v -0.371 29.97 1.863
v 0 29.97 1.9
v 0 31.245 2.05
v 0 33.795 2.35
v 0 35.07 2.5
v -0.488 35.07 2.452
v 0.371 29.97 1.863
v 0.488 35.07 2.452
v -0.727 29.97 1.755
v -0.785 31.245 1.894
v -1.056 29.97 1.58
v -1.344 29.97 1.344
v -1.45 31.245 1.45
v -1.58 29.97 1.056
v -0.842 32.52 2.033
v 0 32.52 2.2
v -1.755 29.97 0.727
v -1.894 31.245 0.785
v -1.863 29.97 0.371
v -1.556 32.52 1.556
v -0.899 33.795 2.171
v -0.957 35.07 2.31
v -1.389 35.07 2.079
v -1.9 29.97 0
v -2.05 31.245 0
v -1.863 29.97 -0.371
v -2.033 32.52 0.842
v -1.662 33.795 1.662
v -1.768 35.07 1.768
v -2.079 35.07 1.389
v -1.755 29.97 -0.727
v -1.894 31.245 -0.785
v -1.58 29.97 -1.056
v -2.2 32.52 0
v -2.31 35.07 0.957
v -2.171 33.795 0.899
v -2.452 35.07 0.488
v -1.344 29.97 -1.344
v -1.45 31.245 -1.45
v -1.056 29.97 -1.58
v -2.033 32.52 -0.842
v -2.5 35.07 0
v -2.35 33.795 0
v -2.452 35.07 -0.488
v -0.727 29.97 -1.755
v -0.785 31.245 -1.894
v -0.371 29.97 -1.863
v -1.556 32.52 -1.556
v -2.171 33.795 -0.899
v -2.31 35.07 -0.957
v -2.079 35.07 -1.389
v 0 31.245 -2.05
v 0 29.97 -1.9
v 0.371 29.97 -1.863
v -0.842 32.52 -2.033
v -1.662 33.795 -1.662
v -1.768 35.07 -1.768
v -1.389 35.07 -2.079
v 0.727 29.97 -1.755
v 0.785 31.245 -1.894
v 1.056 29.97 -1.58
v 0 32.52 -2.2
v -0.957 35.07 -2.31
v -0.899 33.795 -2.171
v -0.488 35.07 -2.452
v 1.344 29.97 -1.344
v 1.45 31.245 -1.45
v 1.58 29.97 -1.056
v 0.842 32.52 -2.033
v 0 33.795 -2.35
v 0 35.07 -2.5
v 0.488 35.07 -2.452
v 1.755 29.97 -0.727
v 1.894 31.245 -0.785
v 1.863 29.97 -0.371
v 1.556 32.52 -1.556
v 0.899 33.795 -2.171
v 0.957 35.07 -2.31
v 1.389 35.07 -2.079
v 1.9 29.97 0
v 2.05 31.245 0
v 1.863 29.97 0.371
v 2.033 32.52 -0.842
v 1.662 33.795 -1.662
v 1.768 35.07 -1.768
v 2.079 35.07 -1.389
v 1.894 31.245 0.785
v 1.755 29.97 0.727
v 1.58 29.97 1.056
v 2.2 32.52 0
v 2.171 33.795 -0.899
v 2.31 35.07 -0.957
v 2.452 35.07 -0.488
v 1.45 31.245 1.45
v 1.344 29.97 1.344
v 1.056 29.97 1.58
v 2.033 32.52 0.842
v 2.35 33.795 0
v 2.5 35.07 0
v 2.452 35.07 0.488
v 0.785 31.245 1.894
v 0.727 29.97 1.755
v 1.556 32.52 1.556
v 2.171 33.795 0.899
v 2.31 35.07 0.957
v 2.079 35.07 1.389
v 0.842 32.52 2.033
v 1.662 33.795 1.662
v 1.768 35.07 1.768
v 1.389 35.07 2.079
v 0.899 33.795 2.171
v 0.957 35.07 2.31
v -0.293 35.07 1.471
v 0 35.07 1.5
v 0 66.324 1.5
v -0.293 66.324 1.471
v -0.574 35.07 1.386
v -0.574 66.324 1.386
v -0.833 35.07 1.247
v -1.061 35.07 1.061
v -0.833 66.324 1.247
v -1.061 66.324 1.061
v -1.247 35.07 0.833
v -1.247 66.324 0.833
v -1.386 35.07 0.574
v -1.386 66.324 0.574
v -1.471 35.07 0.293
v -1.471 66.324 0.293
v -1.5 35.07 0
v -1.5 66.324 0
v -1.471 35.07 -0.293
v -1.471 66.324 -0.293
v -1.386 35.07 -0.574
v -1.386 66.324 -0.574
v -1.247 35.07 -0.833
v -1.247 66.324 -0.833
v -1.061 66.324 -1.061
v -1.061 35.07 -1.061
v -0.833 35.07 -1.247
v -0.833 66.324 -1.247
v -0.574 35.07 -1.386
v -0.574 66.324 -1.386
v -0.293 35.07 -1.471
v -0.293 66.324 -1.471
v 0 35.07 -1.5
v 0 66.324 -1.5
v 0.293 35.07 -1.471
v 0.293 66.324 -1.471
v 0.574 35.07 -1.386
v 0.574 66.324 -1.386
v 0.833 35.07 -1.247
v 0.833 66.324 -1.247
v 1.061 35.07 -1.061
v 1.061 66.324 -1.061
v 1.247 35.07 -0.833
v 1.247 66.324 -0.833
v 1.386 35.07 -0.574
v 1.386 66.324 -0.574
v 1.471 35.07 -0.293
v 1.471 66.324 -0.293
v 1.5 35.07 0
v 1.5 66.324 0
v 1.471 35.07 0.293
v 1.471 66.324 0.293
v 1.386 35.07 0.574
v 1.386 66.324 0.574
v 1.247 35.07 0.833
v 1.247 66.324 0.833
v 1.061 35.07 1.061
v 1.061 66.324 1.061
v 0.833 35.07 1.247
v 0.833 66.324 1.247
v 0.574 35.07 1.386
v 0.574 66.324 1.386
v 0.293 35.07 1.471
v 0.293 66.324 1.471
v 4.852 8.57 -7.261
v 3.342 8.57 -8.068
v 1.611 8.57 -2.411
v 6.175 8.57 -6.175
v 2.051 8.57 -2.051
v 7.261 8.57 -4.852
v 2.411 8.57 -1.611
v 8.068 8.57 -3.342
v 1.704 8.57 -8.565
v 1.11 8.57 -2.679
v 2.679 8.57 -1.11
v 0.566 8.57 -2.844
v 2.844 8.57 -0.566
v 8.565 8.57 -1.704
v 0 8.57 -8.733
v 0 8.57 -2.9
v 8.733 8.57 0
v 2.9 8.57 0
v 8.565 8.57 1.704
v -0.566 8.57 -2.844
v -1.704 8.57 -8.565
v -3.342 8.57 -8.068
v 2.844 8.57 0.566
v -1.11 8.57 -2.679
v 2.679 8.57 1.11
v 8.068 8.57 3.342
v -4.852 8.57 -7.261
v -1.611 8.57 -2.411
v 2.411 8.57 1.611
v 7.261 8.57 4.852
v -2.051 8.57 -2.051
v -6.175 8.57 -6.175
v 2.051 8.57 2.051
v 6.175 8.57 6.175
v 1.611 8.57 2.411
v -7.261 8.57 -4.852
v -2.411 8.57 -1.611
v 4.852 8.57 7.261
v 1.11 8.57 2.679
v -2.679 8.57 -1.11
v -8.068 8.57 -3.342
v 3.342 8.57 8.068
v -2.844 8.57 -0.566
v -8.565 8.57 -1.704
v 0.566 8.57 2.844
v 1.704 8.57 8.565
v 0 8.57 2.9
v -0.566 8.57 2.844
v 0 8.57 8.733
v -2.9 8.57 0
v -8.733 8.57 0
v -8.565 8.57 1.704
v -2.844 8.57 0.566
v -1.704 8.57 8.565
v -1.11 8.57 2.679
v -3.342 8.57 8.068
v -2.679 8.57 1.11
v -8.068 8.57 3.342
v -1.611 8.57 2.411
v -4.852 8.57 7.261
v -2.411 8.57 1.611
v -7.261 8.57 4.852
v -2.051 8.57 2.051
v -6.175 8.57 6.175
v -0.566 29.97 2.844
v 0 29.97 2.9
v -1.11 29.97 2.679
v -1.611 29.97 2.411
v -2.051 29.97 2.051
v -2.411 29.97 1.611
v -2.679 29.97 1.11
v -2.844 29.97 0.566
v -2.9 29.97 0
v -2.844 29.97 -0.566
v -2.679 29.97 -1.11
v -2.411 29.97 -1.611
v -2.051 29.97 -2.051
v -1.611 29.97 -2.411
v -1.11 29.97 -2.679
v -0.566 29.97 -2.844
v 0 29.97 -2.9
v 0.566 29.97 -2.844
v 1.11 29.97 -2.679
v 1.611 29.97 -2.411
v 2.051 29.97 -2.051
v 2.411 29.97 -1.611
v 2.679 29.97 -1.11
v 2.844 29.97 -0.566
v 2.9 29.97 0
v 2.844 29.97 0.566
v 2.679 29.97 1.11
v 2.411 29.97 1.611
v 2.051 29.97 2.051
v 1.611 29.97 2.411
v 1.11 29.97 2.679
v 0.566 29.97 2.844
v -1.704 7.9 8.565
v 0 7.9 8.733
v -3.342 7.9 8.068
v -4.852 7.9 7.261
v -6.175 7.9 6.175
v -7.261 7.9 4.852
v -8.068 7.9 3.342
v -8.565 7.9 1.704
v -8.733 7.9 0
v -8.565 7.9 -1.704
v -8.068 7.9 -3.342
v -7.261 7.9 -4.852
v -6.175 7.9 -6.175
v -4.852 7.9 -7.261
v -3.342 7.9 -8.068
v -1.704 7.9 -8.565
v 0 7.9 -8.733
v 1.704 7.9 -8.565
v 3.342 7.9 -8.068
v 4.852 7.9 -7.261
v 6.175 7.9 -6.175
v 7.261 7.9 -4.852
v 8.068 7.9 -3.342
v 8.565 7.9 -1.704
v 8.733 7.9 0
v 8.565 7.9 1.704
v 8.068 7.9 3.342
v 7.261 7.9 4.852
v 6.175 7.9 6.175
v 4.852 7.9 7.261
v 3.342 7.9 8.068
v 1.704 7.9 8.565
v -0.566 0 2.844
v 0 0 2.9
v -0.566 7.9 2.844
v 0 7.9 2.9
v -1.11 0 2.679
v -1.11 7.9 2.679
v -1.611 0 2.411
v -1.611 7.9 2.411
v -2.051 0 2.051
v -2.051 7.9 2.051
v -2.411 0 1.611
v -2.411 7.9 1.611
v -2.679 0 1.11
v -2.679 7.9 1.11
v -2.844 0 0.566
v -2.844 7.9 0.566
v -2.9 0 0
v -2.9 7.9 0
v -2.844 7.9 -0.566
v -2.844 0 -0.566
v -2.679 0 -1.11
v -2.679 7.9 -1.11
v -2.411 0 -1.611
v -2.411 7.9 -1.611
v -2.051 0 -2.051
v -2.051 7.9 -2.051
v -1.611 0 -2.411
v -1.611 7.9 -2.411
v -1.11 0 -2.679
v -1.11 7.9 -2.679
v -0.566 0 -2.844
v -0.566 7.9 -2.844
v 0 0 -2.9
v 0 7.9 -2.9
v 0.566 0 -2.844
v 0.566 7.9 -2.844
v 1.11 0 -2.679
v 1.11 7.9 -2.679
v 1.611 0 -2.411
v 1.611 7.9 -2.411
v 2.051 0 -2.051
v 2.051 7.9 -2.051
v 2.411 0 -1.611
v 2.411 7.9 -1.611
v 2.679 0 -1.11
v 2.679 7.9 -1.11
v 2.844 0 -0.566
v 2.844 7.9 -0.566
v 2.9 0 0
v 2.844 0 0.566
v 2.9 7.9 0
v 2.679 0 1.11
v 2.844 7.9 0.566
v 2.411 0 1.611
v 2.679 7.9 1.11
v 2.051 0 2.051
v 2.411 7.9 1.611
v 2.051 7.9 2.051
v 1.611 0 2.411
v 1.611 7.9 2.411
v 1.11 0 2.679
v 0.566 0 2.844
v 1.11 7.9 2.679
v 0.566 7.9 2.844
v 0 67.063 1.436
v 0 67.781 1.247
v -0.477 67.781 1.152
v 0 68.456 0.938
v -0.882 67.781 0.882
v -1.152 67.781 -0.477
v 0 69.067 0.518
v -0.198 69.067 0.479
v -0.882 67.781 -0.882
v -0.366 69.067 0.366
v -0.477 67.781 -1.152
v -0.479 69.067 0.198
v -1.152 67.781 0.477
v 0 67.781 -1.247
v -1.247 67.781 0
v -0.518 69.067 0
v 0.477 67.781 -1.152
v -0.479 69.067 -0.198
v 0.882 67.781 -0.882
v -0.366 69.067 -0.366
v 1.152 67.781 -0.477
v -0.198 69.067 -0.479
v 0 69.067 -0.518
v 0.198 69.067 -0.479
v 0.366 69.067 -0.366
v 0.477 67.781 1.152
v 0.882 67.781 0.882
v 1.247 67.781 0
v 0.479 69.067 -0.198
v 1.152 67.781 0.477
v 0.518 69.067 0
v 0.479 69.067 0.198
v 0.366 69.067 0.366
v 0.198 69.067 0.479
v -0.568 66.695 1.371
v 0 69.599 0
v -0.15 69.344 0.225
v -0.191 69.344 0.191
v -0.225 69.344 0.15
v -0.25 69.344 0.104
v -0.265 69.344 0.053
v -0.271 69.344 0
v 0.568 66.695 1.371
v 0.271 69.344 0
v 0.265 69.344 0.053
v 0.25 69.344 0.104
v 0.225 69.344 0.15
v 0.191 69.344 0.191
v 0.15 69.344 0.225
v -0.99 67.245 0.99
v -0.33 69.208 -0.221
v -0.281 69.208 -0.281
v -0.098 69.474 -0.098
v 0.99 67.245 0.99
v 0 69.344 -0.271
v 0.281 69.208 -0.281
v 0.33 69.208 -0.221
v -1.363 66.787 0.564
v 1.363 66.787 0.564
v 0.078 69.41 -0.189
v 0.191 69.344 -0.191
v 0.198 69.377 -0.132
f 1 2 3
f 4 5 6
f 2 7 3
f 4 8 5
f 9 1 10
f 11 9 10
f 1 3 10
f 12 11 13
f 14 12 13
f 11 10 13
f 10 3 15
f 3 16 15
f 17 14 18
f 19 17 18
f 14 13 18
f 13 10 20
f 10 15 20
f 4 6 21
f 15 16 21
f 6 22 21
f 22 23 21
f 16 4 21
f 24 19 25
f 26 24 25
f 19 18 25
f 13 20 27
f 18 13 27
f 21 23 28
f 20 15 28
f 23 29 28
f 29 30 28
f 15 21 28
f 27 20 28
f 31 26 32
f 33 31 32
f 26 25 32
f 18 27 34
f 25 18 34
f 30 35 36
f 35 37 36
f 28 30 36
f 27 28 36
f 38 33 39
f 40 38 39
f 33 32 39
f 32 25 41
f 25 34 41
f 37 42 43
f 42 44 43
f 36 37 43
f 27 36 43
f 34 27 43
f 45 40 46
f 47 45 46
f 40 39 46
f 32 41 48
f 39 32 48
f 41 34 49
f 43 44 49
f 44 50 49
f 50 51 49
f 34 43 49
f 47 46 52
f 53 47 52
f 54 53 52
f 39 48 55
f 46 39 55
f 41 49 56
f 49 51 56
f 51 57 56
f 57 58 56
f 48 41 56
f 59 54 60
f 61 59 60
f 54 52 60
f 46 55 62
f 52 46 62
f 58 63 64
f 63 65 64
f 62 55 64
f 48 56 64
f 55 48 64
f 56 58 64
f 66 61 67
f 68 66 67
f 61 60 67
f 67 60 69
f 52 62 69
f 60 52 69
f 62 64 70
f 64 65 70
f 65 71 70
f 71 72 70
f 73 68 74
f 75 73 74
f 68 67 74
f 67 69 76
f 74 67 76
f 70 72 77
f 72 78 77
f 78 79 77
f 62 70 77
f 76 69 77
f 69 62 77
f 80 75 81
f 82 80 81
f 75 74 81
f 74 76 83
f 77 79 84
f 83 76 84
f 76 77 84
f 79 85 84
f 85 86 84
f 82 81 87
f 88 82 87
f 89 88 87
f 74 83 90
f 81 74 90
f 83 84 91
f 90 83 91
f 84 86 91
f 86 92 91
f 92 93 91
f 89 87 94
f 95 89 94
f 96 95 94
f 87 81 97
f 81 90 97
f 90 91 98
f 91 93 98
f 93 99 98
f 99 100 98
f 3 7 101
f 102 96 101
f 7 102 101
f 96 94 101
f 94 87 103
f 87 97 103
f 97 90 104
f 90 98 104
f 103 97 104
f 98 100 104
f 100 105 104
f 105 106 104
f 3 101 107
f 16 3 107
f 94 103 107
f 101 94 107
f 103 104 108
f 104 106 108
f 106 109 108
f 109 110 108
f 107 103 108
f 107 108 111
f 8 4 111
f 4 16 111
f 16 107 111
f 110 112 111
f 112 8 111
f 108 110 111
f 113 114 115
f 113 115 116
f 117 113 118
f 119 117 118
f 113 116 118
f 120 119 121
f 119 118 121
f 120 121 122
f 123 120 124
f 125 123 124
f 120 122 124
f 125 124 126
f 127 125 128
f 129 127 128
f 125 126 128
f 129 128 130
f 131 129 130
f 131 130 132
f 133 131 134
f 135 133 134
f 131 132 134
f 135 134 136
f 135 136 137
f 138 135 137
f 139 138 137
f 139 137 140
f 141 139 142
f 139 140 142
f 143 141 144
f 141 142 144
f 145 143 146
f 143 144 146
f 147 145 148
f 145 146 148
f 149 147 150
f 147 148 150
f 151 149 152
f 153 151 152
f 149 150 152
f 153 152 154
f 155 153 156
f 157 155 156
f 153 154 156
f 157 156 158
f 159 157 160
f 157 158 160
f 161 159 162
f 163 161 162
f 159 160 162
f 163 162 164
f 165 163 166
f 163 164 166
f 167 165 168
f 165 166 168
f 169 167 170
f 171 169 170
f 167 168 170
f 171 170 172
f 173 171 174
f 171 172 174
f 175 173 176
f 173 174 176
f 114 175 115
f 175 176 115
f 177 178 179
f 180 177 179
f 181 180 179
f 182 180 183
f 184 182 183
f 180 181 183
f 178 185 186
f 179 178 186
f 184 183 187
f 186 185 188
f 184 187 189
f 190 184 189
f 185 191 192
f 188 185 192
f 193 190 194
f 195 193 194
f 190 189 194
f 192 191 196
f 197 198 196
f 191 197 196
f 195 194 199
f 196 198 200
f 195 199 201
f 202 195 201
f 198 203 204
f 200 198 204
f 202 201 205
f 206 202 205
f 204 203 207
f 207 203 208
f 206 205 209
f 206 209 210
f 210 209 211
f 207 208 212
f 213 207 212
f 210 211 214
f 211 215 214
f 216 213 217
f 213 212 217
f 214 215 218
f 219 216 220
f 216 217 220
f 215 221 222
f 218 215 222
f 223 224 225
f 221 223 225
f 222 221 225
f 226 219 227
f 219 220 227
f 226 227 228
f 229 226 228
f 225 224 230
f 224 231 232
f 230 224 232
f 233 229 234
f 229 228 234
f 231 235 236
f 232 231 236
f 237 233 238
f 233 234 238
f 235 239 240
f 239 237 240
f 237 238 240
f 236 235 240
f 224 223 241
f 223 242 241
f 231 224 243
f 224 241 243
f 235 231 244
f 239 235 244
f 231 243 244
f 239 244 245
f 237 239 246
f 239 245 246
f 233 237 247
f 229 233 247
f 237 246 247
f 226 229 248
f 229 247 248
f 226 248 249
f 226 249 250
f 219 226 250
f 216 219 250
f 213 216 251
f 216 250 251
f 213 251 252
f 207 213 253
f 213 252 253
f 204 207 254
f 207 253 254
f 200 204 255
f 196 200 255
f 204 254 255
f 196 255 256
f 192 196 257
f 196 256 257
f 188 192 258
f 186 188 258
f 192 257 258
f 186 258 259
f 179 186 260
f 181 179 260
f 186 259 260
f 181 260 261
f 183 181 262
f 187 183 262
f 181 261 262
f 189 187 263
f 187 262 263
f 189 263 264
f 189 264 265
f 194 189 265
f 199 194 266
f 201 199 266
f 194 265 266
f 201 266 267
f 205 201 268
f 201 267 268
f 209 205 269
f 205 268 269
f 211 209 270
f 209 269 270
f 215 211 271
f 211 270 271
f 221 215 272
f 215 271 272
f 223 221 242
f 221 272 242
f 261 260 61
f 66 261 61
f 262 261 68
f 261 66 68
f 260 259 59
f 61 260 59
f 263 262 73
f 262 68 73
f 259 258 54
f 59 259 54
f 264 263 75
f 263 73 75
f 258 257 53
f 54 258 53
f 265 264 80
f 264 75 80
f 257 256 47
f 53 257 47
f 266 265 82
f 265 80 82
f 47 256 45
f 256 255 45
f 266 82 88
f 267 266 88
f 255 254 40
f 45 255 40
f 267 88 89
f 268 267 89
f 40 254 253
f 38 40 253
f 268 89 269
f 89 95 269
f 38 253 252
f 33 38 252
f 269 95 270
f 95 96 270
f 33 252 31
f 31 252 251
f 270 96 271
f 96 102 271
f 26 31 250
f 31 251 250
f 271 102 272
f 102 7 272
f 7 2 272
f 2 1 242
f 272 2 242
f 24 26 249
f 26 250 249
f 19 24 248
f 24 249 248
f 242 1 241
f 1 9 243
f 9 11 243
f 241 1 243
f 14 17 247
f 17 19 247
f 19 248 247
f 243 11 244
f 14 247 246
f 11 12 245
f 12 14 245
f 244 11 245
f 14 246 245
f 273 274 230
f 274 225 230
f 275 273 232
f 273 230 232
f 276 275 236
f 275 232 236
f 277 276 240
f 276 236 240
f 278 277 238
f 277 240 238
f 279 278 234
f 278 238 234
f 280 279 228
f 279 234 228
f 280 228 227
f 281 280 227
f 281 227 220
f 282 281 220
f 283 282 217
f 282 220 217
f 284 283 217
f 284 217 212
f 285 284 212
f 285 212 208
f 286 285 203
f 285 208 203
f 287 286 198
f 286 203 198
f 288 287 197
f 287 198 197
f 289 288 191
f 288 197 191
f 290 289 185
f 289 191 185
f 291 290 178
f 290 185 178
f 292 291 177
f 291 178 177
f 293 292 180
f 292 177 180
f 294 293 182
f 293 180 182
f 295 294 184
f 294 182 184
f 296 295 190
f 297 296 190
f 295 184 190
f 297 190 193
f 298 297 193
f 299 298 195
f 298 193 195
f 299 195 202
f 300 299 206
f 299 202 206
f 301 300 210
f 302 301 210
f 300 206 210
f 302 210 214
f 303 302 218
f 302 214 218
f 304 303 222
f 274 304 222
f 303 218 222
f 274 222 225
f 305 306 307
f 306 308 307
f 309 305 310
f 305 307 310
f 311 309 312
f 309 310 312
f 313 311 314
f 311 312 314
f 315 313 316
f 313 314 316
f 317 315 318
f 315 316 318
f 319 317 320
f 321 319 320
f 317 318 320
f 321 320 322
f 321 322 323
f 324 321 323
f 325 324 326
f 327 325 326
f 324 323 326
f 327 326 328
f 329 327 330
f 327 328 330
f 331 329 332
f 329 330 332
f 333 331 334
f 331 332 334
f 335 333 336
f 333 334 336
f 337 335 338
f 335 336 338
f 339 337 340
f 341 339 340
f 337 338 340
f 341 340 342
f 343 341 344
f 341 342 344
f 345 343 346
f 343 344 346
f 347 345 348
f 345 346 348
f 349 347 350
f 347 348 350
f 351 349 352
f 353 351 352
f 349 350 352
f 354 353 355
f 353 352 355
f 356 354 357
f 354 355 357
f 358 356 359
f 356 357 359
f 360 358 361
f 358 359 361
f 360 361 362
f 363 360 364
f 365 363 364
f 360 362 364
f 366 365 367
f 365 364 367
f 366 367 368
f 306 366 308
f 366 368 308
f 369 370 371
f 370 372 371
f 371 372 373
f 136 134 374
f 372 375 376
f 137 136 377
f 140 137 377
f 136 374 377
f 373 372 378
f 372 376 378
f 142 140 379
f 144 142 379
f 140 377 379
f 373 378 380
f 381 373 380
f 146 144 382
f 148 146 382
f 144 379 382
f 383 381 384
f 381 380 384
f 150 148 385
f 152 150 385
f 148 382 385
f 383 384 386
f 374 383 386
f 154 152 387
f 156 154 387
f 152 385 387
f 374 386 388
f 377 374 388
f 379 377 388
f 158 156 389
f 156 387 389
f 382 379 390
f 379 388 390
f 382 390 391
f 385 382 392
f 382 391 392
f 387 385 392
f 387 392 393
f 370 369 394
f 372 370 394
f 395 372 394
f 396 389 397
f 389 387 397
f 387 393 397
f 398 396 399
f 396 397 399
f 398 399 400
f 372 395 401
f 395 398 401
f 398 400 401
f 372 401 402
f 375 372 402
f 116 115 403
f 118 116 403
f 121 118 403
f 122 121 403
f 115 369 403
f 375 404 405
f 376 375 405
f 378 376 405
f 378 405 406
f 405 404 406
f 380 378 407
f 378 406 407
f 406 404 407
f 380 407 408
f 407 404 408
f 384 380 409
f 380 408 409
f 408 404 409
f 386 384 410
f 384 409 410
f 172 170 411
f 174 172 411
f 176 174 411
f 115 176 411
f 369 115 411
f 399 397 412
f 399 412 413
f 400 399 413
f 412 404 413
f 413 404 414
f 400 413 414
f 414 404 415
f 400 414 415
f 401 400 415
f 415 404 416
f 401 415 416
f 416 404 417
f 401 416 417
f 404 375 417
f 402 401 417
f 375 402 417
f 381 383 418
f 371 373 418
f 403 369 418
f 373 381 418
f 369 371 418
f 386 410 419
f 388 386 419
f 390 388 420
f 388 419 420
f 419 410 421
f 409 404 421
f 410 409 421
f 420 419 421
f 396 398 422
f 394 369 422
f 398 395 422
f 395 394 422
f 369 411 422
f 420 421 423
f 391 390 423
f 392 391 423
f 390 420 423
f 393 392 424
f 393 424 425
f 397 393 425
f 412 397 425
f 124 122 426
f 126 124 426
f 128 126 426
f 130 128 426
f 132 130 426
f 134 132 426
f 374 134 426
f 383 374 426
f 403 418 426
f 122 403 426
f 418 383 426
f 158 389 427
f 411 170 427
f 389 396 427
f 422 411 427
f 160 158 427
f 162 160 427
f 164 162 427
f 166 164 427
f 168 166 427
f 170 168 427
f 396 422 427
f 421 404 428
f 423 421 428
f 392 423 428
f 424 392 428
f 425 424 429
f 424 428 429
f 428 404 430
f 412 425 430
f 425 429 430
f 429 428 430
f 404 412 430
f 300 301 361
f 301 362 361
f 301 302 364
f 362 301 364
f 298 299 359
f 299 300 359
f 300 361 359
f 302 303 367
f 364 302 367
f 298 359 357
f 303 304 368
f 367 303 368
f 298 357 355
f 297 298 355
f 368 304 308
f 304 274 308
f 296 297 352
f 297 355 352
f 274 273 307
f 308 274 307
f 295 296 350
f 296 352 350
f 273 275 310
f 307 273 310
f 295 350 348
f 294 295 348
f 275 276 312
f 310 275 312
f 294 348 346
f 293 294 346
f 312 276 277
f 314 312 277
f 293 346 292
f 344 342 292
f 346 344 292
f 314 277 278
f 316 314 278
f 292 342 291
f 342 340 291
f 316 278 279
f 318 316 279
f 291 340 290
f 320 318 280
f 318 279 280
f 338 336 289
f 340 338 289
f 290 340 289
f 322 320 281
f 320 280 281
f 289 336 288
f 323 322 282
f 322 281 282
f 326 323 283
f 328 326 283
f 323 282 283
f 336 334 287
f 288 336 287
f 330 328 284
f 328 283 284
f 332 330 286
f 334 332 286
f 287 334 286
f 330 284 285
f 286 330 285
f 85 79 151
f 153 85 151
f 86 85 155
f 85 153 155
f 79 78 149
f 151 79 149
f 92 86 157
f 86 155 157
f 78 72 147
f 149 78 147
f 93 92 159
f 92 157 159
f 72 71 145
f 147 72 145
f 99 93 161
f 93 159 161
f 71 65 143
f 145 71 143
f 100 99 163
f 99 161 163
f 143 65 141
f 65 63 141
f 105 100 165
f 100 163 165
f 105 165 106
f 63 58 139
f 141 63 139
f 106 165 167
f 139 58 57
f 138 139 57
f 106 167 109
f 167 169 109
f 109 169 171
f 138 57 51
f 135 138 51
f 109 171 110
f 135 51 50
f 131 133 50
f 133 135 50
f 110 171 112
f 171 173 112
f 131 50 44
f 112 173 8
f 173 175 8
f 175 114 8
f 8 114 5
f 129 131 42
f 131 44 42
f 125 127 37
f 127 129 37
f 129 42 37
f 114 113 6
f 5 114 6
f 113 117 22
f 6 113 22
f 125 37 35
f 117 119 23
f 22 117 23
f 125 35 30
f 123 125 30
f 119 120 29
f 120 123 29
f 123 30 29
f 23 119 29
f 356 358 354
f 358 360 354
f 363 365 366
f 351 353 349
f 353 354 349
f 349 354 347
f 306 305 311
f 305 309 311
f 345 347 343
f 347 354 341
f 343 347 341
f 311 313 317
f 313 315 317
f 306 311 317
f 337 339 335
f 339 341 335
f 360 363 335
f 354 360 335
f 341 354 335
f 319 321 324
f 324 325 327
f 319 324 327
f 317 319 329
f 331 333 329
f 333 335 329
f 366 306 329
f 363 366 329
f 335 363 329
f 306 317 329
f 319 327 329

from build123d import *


with BuildPart() as part:
    # Sketch1 → Revolve1 (revolve)
    with BuildSketch(Plane.XY, mode=Mode.PRIVATE) as revolve1_sk:
        with BuildLine():
            Line((0, 0), (2.9, 0))
            Line((2.9, 0), (2.9, 7.9))
            Line((2.9, 7.9), (8.732864907, 7.9))
            Line((8.732864907, 7.9), (8.732864907, 8.57))
            Line((8.732864907, 8.57), (2.9, 8.57))
            Line((2.9, 8.57), (2.9, 29.97))
            Line((2.9, 29.97), (1.9, 29.97))
            Line((1.9, 29.97), (2.5, 35.07))
            Line((2.5, 35.07), (1.5, 35.07))
            Line((1.5, 35.07), (1.5, 66.323834281))
            ThreePointArc((1.5, 66.323834281), (1.107157772, 68.124815809), (0, 69.598607228))
            Line((0, 69.598607228), (0, 0))
        make_face()
    revolve(revolve1_sk.sketch.rotate(Axis((0, 69.598607228, 0), (0, -1, 0)), 90), axis=Axis((0, 69.598607228, 0), (0, -1, 0)))


solid = part.part
